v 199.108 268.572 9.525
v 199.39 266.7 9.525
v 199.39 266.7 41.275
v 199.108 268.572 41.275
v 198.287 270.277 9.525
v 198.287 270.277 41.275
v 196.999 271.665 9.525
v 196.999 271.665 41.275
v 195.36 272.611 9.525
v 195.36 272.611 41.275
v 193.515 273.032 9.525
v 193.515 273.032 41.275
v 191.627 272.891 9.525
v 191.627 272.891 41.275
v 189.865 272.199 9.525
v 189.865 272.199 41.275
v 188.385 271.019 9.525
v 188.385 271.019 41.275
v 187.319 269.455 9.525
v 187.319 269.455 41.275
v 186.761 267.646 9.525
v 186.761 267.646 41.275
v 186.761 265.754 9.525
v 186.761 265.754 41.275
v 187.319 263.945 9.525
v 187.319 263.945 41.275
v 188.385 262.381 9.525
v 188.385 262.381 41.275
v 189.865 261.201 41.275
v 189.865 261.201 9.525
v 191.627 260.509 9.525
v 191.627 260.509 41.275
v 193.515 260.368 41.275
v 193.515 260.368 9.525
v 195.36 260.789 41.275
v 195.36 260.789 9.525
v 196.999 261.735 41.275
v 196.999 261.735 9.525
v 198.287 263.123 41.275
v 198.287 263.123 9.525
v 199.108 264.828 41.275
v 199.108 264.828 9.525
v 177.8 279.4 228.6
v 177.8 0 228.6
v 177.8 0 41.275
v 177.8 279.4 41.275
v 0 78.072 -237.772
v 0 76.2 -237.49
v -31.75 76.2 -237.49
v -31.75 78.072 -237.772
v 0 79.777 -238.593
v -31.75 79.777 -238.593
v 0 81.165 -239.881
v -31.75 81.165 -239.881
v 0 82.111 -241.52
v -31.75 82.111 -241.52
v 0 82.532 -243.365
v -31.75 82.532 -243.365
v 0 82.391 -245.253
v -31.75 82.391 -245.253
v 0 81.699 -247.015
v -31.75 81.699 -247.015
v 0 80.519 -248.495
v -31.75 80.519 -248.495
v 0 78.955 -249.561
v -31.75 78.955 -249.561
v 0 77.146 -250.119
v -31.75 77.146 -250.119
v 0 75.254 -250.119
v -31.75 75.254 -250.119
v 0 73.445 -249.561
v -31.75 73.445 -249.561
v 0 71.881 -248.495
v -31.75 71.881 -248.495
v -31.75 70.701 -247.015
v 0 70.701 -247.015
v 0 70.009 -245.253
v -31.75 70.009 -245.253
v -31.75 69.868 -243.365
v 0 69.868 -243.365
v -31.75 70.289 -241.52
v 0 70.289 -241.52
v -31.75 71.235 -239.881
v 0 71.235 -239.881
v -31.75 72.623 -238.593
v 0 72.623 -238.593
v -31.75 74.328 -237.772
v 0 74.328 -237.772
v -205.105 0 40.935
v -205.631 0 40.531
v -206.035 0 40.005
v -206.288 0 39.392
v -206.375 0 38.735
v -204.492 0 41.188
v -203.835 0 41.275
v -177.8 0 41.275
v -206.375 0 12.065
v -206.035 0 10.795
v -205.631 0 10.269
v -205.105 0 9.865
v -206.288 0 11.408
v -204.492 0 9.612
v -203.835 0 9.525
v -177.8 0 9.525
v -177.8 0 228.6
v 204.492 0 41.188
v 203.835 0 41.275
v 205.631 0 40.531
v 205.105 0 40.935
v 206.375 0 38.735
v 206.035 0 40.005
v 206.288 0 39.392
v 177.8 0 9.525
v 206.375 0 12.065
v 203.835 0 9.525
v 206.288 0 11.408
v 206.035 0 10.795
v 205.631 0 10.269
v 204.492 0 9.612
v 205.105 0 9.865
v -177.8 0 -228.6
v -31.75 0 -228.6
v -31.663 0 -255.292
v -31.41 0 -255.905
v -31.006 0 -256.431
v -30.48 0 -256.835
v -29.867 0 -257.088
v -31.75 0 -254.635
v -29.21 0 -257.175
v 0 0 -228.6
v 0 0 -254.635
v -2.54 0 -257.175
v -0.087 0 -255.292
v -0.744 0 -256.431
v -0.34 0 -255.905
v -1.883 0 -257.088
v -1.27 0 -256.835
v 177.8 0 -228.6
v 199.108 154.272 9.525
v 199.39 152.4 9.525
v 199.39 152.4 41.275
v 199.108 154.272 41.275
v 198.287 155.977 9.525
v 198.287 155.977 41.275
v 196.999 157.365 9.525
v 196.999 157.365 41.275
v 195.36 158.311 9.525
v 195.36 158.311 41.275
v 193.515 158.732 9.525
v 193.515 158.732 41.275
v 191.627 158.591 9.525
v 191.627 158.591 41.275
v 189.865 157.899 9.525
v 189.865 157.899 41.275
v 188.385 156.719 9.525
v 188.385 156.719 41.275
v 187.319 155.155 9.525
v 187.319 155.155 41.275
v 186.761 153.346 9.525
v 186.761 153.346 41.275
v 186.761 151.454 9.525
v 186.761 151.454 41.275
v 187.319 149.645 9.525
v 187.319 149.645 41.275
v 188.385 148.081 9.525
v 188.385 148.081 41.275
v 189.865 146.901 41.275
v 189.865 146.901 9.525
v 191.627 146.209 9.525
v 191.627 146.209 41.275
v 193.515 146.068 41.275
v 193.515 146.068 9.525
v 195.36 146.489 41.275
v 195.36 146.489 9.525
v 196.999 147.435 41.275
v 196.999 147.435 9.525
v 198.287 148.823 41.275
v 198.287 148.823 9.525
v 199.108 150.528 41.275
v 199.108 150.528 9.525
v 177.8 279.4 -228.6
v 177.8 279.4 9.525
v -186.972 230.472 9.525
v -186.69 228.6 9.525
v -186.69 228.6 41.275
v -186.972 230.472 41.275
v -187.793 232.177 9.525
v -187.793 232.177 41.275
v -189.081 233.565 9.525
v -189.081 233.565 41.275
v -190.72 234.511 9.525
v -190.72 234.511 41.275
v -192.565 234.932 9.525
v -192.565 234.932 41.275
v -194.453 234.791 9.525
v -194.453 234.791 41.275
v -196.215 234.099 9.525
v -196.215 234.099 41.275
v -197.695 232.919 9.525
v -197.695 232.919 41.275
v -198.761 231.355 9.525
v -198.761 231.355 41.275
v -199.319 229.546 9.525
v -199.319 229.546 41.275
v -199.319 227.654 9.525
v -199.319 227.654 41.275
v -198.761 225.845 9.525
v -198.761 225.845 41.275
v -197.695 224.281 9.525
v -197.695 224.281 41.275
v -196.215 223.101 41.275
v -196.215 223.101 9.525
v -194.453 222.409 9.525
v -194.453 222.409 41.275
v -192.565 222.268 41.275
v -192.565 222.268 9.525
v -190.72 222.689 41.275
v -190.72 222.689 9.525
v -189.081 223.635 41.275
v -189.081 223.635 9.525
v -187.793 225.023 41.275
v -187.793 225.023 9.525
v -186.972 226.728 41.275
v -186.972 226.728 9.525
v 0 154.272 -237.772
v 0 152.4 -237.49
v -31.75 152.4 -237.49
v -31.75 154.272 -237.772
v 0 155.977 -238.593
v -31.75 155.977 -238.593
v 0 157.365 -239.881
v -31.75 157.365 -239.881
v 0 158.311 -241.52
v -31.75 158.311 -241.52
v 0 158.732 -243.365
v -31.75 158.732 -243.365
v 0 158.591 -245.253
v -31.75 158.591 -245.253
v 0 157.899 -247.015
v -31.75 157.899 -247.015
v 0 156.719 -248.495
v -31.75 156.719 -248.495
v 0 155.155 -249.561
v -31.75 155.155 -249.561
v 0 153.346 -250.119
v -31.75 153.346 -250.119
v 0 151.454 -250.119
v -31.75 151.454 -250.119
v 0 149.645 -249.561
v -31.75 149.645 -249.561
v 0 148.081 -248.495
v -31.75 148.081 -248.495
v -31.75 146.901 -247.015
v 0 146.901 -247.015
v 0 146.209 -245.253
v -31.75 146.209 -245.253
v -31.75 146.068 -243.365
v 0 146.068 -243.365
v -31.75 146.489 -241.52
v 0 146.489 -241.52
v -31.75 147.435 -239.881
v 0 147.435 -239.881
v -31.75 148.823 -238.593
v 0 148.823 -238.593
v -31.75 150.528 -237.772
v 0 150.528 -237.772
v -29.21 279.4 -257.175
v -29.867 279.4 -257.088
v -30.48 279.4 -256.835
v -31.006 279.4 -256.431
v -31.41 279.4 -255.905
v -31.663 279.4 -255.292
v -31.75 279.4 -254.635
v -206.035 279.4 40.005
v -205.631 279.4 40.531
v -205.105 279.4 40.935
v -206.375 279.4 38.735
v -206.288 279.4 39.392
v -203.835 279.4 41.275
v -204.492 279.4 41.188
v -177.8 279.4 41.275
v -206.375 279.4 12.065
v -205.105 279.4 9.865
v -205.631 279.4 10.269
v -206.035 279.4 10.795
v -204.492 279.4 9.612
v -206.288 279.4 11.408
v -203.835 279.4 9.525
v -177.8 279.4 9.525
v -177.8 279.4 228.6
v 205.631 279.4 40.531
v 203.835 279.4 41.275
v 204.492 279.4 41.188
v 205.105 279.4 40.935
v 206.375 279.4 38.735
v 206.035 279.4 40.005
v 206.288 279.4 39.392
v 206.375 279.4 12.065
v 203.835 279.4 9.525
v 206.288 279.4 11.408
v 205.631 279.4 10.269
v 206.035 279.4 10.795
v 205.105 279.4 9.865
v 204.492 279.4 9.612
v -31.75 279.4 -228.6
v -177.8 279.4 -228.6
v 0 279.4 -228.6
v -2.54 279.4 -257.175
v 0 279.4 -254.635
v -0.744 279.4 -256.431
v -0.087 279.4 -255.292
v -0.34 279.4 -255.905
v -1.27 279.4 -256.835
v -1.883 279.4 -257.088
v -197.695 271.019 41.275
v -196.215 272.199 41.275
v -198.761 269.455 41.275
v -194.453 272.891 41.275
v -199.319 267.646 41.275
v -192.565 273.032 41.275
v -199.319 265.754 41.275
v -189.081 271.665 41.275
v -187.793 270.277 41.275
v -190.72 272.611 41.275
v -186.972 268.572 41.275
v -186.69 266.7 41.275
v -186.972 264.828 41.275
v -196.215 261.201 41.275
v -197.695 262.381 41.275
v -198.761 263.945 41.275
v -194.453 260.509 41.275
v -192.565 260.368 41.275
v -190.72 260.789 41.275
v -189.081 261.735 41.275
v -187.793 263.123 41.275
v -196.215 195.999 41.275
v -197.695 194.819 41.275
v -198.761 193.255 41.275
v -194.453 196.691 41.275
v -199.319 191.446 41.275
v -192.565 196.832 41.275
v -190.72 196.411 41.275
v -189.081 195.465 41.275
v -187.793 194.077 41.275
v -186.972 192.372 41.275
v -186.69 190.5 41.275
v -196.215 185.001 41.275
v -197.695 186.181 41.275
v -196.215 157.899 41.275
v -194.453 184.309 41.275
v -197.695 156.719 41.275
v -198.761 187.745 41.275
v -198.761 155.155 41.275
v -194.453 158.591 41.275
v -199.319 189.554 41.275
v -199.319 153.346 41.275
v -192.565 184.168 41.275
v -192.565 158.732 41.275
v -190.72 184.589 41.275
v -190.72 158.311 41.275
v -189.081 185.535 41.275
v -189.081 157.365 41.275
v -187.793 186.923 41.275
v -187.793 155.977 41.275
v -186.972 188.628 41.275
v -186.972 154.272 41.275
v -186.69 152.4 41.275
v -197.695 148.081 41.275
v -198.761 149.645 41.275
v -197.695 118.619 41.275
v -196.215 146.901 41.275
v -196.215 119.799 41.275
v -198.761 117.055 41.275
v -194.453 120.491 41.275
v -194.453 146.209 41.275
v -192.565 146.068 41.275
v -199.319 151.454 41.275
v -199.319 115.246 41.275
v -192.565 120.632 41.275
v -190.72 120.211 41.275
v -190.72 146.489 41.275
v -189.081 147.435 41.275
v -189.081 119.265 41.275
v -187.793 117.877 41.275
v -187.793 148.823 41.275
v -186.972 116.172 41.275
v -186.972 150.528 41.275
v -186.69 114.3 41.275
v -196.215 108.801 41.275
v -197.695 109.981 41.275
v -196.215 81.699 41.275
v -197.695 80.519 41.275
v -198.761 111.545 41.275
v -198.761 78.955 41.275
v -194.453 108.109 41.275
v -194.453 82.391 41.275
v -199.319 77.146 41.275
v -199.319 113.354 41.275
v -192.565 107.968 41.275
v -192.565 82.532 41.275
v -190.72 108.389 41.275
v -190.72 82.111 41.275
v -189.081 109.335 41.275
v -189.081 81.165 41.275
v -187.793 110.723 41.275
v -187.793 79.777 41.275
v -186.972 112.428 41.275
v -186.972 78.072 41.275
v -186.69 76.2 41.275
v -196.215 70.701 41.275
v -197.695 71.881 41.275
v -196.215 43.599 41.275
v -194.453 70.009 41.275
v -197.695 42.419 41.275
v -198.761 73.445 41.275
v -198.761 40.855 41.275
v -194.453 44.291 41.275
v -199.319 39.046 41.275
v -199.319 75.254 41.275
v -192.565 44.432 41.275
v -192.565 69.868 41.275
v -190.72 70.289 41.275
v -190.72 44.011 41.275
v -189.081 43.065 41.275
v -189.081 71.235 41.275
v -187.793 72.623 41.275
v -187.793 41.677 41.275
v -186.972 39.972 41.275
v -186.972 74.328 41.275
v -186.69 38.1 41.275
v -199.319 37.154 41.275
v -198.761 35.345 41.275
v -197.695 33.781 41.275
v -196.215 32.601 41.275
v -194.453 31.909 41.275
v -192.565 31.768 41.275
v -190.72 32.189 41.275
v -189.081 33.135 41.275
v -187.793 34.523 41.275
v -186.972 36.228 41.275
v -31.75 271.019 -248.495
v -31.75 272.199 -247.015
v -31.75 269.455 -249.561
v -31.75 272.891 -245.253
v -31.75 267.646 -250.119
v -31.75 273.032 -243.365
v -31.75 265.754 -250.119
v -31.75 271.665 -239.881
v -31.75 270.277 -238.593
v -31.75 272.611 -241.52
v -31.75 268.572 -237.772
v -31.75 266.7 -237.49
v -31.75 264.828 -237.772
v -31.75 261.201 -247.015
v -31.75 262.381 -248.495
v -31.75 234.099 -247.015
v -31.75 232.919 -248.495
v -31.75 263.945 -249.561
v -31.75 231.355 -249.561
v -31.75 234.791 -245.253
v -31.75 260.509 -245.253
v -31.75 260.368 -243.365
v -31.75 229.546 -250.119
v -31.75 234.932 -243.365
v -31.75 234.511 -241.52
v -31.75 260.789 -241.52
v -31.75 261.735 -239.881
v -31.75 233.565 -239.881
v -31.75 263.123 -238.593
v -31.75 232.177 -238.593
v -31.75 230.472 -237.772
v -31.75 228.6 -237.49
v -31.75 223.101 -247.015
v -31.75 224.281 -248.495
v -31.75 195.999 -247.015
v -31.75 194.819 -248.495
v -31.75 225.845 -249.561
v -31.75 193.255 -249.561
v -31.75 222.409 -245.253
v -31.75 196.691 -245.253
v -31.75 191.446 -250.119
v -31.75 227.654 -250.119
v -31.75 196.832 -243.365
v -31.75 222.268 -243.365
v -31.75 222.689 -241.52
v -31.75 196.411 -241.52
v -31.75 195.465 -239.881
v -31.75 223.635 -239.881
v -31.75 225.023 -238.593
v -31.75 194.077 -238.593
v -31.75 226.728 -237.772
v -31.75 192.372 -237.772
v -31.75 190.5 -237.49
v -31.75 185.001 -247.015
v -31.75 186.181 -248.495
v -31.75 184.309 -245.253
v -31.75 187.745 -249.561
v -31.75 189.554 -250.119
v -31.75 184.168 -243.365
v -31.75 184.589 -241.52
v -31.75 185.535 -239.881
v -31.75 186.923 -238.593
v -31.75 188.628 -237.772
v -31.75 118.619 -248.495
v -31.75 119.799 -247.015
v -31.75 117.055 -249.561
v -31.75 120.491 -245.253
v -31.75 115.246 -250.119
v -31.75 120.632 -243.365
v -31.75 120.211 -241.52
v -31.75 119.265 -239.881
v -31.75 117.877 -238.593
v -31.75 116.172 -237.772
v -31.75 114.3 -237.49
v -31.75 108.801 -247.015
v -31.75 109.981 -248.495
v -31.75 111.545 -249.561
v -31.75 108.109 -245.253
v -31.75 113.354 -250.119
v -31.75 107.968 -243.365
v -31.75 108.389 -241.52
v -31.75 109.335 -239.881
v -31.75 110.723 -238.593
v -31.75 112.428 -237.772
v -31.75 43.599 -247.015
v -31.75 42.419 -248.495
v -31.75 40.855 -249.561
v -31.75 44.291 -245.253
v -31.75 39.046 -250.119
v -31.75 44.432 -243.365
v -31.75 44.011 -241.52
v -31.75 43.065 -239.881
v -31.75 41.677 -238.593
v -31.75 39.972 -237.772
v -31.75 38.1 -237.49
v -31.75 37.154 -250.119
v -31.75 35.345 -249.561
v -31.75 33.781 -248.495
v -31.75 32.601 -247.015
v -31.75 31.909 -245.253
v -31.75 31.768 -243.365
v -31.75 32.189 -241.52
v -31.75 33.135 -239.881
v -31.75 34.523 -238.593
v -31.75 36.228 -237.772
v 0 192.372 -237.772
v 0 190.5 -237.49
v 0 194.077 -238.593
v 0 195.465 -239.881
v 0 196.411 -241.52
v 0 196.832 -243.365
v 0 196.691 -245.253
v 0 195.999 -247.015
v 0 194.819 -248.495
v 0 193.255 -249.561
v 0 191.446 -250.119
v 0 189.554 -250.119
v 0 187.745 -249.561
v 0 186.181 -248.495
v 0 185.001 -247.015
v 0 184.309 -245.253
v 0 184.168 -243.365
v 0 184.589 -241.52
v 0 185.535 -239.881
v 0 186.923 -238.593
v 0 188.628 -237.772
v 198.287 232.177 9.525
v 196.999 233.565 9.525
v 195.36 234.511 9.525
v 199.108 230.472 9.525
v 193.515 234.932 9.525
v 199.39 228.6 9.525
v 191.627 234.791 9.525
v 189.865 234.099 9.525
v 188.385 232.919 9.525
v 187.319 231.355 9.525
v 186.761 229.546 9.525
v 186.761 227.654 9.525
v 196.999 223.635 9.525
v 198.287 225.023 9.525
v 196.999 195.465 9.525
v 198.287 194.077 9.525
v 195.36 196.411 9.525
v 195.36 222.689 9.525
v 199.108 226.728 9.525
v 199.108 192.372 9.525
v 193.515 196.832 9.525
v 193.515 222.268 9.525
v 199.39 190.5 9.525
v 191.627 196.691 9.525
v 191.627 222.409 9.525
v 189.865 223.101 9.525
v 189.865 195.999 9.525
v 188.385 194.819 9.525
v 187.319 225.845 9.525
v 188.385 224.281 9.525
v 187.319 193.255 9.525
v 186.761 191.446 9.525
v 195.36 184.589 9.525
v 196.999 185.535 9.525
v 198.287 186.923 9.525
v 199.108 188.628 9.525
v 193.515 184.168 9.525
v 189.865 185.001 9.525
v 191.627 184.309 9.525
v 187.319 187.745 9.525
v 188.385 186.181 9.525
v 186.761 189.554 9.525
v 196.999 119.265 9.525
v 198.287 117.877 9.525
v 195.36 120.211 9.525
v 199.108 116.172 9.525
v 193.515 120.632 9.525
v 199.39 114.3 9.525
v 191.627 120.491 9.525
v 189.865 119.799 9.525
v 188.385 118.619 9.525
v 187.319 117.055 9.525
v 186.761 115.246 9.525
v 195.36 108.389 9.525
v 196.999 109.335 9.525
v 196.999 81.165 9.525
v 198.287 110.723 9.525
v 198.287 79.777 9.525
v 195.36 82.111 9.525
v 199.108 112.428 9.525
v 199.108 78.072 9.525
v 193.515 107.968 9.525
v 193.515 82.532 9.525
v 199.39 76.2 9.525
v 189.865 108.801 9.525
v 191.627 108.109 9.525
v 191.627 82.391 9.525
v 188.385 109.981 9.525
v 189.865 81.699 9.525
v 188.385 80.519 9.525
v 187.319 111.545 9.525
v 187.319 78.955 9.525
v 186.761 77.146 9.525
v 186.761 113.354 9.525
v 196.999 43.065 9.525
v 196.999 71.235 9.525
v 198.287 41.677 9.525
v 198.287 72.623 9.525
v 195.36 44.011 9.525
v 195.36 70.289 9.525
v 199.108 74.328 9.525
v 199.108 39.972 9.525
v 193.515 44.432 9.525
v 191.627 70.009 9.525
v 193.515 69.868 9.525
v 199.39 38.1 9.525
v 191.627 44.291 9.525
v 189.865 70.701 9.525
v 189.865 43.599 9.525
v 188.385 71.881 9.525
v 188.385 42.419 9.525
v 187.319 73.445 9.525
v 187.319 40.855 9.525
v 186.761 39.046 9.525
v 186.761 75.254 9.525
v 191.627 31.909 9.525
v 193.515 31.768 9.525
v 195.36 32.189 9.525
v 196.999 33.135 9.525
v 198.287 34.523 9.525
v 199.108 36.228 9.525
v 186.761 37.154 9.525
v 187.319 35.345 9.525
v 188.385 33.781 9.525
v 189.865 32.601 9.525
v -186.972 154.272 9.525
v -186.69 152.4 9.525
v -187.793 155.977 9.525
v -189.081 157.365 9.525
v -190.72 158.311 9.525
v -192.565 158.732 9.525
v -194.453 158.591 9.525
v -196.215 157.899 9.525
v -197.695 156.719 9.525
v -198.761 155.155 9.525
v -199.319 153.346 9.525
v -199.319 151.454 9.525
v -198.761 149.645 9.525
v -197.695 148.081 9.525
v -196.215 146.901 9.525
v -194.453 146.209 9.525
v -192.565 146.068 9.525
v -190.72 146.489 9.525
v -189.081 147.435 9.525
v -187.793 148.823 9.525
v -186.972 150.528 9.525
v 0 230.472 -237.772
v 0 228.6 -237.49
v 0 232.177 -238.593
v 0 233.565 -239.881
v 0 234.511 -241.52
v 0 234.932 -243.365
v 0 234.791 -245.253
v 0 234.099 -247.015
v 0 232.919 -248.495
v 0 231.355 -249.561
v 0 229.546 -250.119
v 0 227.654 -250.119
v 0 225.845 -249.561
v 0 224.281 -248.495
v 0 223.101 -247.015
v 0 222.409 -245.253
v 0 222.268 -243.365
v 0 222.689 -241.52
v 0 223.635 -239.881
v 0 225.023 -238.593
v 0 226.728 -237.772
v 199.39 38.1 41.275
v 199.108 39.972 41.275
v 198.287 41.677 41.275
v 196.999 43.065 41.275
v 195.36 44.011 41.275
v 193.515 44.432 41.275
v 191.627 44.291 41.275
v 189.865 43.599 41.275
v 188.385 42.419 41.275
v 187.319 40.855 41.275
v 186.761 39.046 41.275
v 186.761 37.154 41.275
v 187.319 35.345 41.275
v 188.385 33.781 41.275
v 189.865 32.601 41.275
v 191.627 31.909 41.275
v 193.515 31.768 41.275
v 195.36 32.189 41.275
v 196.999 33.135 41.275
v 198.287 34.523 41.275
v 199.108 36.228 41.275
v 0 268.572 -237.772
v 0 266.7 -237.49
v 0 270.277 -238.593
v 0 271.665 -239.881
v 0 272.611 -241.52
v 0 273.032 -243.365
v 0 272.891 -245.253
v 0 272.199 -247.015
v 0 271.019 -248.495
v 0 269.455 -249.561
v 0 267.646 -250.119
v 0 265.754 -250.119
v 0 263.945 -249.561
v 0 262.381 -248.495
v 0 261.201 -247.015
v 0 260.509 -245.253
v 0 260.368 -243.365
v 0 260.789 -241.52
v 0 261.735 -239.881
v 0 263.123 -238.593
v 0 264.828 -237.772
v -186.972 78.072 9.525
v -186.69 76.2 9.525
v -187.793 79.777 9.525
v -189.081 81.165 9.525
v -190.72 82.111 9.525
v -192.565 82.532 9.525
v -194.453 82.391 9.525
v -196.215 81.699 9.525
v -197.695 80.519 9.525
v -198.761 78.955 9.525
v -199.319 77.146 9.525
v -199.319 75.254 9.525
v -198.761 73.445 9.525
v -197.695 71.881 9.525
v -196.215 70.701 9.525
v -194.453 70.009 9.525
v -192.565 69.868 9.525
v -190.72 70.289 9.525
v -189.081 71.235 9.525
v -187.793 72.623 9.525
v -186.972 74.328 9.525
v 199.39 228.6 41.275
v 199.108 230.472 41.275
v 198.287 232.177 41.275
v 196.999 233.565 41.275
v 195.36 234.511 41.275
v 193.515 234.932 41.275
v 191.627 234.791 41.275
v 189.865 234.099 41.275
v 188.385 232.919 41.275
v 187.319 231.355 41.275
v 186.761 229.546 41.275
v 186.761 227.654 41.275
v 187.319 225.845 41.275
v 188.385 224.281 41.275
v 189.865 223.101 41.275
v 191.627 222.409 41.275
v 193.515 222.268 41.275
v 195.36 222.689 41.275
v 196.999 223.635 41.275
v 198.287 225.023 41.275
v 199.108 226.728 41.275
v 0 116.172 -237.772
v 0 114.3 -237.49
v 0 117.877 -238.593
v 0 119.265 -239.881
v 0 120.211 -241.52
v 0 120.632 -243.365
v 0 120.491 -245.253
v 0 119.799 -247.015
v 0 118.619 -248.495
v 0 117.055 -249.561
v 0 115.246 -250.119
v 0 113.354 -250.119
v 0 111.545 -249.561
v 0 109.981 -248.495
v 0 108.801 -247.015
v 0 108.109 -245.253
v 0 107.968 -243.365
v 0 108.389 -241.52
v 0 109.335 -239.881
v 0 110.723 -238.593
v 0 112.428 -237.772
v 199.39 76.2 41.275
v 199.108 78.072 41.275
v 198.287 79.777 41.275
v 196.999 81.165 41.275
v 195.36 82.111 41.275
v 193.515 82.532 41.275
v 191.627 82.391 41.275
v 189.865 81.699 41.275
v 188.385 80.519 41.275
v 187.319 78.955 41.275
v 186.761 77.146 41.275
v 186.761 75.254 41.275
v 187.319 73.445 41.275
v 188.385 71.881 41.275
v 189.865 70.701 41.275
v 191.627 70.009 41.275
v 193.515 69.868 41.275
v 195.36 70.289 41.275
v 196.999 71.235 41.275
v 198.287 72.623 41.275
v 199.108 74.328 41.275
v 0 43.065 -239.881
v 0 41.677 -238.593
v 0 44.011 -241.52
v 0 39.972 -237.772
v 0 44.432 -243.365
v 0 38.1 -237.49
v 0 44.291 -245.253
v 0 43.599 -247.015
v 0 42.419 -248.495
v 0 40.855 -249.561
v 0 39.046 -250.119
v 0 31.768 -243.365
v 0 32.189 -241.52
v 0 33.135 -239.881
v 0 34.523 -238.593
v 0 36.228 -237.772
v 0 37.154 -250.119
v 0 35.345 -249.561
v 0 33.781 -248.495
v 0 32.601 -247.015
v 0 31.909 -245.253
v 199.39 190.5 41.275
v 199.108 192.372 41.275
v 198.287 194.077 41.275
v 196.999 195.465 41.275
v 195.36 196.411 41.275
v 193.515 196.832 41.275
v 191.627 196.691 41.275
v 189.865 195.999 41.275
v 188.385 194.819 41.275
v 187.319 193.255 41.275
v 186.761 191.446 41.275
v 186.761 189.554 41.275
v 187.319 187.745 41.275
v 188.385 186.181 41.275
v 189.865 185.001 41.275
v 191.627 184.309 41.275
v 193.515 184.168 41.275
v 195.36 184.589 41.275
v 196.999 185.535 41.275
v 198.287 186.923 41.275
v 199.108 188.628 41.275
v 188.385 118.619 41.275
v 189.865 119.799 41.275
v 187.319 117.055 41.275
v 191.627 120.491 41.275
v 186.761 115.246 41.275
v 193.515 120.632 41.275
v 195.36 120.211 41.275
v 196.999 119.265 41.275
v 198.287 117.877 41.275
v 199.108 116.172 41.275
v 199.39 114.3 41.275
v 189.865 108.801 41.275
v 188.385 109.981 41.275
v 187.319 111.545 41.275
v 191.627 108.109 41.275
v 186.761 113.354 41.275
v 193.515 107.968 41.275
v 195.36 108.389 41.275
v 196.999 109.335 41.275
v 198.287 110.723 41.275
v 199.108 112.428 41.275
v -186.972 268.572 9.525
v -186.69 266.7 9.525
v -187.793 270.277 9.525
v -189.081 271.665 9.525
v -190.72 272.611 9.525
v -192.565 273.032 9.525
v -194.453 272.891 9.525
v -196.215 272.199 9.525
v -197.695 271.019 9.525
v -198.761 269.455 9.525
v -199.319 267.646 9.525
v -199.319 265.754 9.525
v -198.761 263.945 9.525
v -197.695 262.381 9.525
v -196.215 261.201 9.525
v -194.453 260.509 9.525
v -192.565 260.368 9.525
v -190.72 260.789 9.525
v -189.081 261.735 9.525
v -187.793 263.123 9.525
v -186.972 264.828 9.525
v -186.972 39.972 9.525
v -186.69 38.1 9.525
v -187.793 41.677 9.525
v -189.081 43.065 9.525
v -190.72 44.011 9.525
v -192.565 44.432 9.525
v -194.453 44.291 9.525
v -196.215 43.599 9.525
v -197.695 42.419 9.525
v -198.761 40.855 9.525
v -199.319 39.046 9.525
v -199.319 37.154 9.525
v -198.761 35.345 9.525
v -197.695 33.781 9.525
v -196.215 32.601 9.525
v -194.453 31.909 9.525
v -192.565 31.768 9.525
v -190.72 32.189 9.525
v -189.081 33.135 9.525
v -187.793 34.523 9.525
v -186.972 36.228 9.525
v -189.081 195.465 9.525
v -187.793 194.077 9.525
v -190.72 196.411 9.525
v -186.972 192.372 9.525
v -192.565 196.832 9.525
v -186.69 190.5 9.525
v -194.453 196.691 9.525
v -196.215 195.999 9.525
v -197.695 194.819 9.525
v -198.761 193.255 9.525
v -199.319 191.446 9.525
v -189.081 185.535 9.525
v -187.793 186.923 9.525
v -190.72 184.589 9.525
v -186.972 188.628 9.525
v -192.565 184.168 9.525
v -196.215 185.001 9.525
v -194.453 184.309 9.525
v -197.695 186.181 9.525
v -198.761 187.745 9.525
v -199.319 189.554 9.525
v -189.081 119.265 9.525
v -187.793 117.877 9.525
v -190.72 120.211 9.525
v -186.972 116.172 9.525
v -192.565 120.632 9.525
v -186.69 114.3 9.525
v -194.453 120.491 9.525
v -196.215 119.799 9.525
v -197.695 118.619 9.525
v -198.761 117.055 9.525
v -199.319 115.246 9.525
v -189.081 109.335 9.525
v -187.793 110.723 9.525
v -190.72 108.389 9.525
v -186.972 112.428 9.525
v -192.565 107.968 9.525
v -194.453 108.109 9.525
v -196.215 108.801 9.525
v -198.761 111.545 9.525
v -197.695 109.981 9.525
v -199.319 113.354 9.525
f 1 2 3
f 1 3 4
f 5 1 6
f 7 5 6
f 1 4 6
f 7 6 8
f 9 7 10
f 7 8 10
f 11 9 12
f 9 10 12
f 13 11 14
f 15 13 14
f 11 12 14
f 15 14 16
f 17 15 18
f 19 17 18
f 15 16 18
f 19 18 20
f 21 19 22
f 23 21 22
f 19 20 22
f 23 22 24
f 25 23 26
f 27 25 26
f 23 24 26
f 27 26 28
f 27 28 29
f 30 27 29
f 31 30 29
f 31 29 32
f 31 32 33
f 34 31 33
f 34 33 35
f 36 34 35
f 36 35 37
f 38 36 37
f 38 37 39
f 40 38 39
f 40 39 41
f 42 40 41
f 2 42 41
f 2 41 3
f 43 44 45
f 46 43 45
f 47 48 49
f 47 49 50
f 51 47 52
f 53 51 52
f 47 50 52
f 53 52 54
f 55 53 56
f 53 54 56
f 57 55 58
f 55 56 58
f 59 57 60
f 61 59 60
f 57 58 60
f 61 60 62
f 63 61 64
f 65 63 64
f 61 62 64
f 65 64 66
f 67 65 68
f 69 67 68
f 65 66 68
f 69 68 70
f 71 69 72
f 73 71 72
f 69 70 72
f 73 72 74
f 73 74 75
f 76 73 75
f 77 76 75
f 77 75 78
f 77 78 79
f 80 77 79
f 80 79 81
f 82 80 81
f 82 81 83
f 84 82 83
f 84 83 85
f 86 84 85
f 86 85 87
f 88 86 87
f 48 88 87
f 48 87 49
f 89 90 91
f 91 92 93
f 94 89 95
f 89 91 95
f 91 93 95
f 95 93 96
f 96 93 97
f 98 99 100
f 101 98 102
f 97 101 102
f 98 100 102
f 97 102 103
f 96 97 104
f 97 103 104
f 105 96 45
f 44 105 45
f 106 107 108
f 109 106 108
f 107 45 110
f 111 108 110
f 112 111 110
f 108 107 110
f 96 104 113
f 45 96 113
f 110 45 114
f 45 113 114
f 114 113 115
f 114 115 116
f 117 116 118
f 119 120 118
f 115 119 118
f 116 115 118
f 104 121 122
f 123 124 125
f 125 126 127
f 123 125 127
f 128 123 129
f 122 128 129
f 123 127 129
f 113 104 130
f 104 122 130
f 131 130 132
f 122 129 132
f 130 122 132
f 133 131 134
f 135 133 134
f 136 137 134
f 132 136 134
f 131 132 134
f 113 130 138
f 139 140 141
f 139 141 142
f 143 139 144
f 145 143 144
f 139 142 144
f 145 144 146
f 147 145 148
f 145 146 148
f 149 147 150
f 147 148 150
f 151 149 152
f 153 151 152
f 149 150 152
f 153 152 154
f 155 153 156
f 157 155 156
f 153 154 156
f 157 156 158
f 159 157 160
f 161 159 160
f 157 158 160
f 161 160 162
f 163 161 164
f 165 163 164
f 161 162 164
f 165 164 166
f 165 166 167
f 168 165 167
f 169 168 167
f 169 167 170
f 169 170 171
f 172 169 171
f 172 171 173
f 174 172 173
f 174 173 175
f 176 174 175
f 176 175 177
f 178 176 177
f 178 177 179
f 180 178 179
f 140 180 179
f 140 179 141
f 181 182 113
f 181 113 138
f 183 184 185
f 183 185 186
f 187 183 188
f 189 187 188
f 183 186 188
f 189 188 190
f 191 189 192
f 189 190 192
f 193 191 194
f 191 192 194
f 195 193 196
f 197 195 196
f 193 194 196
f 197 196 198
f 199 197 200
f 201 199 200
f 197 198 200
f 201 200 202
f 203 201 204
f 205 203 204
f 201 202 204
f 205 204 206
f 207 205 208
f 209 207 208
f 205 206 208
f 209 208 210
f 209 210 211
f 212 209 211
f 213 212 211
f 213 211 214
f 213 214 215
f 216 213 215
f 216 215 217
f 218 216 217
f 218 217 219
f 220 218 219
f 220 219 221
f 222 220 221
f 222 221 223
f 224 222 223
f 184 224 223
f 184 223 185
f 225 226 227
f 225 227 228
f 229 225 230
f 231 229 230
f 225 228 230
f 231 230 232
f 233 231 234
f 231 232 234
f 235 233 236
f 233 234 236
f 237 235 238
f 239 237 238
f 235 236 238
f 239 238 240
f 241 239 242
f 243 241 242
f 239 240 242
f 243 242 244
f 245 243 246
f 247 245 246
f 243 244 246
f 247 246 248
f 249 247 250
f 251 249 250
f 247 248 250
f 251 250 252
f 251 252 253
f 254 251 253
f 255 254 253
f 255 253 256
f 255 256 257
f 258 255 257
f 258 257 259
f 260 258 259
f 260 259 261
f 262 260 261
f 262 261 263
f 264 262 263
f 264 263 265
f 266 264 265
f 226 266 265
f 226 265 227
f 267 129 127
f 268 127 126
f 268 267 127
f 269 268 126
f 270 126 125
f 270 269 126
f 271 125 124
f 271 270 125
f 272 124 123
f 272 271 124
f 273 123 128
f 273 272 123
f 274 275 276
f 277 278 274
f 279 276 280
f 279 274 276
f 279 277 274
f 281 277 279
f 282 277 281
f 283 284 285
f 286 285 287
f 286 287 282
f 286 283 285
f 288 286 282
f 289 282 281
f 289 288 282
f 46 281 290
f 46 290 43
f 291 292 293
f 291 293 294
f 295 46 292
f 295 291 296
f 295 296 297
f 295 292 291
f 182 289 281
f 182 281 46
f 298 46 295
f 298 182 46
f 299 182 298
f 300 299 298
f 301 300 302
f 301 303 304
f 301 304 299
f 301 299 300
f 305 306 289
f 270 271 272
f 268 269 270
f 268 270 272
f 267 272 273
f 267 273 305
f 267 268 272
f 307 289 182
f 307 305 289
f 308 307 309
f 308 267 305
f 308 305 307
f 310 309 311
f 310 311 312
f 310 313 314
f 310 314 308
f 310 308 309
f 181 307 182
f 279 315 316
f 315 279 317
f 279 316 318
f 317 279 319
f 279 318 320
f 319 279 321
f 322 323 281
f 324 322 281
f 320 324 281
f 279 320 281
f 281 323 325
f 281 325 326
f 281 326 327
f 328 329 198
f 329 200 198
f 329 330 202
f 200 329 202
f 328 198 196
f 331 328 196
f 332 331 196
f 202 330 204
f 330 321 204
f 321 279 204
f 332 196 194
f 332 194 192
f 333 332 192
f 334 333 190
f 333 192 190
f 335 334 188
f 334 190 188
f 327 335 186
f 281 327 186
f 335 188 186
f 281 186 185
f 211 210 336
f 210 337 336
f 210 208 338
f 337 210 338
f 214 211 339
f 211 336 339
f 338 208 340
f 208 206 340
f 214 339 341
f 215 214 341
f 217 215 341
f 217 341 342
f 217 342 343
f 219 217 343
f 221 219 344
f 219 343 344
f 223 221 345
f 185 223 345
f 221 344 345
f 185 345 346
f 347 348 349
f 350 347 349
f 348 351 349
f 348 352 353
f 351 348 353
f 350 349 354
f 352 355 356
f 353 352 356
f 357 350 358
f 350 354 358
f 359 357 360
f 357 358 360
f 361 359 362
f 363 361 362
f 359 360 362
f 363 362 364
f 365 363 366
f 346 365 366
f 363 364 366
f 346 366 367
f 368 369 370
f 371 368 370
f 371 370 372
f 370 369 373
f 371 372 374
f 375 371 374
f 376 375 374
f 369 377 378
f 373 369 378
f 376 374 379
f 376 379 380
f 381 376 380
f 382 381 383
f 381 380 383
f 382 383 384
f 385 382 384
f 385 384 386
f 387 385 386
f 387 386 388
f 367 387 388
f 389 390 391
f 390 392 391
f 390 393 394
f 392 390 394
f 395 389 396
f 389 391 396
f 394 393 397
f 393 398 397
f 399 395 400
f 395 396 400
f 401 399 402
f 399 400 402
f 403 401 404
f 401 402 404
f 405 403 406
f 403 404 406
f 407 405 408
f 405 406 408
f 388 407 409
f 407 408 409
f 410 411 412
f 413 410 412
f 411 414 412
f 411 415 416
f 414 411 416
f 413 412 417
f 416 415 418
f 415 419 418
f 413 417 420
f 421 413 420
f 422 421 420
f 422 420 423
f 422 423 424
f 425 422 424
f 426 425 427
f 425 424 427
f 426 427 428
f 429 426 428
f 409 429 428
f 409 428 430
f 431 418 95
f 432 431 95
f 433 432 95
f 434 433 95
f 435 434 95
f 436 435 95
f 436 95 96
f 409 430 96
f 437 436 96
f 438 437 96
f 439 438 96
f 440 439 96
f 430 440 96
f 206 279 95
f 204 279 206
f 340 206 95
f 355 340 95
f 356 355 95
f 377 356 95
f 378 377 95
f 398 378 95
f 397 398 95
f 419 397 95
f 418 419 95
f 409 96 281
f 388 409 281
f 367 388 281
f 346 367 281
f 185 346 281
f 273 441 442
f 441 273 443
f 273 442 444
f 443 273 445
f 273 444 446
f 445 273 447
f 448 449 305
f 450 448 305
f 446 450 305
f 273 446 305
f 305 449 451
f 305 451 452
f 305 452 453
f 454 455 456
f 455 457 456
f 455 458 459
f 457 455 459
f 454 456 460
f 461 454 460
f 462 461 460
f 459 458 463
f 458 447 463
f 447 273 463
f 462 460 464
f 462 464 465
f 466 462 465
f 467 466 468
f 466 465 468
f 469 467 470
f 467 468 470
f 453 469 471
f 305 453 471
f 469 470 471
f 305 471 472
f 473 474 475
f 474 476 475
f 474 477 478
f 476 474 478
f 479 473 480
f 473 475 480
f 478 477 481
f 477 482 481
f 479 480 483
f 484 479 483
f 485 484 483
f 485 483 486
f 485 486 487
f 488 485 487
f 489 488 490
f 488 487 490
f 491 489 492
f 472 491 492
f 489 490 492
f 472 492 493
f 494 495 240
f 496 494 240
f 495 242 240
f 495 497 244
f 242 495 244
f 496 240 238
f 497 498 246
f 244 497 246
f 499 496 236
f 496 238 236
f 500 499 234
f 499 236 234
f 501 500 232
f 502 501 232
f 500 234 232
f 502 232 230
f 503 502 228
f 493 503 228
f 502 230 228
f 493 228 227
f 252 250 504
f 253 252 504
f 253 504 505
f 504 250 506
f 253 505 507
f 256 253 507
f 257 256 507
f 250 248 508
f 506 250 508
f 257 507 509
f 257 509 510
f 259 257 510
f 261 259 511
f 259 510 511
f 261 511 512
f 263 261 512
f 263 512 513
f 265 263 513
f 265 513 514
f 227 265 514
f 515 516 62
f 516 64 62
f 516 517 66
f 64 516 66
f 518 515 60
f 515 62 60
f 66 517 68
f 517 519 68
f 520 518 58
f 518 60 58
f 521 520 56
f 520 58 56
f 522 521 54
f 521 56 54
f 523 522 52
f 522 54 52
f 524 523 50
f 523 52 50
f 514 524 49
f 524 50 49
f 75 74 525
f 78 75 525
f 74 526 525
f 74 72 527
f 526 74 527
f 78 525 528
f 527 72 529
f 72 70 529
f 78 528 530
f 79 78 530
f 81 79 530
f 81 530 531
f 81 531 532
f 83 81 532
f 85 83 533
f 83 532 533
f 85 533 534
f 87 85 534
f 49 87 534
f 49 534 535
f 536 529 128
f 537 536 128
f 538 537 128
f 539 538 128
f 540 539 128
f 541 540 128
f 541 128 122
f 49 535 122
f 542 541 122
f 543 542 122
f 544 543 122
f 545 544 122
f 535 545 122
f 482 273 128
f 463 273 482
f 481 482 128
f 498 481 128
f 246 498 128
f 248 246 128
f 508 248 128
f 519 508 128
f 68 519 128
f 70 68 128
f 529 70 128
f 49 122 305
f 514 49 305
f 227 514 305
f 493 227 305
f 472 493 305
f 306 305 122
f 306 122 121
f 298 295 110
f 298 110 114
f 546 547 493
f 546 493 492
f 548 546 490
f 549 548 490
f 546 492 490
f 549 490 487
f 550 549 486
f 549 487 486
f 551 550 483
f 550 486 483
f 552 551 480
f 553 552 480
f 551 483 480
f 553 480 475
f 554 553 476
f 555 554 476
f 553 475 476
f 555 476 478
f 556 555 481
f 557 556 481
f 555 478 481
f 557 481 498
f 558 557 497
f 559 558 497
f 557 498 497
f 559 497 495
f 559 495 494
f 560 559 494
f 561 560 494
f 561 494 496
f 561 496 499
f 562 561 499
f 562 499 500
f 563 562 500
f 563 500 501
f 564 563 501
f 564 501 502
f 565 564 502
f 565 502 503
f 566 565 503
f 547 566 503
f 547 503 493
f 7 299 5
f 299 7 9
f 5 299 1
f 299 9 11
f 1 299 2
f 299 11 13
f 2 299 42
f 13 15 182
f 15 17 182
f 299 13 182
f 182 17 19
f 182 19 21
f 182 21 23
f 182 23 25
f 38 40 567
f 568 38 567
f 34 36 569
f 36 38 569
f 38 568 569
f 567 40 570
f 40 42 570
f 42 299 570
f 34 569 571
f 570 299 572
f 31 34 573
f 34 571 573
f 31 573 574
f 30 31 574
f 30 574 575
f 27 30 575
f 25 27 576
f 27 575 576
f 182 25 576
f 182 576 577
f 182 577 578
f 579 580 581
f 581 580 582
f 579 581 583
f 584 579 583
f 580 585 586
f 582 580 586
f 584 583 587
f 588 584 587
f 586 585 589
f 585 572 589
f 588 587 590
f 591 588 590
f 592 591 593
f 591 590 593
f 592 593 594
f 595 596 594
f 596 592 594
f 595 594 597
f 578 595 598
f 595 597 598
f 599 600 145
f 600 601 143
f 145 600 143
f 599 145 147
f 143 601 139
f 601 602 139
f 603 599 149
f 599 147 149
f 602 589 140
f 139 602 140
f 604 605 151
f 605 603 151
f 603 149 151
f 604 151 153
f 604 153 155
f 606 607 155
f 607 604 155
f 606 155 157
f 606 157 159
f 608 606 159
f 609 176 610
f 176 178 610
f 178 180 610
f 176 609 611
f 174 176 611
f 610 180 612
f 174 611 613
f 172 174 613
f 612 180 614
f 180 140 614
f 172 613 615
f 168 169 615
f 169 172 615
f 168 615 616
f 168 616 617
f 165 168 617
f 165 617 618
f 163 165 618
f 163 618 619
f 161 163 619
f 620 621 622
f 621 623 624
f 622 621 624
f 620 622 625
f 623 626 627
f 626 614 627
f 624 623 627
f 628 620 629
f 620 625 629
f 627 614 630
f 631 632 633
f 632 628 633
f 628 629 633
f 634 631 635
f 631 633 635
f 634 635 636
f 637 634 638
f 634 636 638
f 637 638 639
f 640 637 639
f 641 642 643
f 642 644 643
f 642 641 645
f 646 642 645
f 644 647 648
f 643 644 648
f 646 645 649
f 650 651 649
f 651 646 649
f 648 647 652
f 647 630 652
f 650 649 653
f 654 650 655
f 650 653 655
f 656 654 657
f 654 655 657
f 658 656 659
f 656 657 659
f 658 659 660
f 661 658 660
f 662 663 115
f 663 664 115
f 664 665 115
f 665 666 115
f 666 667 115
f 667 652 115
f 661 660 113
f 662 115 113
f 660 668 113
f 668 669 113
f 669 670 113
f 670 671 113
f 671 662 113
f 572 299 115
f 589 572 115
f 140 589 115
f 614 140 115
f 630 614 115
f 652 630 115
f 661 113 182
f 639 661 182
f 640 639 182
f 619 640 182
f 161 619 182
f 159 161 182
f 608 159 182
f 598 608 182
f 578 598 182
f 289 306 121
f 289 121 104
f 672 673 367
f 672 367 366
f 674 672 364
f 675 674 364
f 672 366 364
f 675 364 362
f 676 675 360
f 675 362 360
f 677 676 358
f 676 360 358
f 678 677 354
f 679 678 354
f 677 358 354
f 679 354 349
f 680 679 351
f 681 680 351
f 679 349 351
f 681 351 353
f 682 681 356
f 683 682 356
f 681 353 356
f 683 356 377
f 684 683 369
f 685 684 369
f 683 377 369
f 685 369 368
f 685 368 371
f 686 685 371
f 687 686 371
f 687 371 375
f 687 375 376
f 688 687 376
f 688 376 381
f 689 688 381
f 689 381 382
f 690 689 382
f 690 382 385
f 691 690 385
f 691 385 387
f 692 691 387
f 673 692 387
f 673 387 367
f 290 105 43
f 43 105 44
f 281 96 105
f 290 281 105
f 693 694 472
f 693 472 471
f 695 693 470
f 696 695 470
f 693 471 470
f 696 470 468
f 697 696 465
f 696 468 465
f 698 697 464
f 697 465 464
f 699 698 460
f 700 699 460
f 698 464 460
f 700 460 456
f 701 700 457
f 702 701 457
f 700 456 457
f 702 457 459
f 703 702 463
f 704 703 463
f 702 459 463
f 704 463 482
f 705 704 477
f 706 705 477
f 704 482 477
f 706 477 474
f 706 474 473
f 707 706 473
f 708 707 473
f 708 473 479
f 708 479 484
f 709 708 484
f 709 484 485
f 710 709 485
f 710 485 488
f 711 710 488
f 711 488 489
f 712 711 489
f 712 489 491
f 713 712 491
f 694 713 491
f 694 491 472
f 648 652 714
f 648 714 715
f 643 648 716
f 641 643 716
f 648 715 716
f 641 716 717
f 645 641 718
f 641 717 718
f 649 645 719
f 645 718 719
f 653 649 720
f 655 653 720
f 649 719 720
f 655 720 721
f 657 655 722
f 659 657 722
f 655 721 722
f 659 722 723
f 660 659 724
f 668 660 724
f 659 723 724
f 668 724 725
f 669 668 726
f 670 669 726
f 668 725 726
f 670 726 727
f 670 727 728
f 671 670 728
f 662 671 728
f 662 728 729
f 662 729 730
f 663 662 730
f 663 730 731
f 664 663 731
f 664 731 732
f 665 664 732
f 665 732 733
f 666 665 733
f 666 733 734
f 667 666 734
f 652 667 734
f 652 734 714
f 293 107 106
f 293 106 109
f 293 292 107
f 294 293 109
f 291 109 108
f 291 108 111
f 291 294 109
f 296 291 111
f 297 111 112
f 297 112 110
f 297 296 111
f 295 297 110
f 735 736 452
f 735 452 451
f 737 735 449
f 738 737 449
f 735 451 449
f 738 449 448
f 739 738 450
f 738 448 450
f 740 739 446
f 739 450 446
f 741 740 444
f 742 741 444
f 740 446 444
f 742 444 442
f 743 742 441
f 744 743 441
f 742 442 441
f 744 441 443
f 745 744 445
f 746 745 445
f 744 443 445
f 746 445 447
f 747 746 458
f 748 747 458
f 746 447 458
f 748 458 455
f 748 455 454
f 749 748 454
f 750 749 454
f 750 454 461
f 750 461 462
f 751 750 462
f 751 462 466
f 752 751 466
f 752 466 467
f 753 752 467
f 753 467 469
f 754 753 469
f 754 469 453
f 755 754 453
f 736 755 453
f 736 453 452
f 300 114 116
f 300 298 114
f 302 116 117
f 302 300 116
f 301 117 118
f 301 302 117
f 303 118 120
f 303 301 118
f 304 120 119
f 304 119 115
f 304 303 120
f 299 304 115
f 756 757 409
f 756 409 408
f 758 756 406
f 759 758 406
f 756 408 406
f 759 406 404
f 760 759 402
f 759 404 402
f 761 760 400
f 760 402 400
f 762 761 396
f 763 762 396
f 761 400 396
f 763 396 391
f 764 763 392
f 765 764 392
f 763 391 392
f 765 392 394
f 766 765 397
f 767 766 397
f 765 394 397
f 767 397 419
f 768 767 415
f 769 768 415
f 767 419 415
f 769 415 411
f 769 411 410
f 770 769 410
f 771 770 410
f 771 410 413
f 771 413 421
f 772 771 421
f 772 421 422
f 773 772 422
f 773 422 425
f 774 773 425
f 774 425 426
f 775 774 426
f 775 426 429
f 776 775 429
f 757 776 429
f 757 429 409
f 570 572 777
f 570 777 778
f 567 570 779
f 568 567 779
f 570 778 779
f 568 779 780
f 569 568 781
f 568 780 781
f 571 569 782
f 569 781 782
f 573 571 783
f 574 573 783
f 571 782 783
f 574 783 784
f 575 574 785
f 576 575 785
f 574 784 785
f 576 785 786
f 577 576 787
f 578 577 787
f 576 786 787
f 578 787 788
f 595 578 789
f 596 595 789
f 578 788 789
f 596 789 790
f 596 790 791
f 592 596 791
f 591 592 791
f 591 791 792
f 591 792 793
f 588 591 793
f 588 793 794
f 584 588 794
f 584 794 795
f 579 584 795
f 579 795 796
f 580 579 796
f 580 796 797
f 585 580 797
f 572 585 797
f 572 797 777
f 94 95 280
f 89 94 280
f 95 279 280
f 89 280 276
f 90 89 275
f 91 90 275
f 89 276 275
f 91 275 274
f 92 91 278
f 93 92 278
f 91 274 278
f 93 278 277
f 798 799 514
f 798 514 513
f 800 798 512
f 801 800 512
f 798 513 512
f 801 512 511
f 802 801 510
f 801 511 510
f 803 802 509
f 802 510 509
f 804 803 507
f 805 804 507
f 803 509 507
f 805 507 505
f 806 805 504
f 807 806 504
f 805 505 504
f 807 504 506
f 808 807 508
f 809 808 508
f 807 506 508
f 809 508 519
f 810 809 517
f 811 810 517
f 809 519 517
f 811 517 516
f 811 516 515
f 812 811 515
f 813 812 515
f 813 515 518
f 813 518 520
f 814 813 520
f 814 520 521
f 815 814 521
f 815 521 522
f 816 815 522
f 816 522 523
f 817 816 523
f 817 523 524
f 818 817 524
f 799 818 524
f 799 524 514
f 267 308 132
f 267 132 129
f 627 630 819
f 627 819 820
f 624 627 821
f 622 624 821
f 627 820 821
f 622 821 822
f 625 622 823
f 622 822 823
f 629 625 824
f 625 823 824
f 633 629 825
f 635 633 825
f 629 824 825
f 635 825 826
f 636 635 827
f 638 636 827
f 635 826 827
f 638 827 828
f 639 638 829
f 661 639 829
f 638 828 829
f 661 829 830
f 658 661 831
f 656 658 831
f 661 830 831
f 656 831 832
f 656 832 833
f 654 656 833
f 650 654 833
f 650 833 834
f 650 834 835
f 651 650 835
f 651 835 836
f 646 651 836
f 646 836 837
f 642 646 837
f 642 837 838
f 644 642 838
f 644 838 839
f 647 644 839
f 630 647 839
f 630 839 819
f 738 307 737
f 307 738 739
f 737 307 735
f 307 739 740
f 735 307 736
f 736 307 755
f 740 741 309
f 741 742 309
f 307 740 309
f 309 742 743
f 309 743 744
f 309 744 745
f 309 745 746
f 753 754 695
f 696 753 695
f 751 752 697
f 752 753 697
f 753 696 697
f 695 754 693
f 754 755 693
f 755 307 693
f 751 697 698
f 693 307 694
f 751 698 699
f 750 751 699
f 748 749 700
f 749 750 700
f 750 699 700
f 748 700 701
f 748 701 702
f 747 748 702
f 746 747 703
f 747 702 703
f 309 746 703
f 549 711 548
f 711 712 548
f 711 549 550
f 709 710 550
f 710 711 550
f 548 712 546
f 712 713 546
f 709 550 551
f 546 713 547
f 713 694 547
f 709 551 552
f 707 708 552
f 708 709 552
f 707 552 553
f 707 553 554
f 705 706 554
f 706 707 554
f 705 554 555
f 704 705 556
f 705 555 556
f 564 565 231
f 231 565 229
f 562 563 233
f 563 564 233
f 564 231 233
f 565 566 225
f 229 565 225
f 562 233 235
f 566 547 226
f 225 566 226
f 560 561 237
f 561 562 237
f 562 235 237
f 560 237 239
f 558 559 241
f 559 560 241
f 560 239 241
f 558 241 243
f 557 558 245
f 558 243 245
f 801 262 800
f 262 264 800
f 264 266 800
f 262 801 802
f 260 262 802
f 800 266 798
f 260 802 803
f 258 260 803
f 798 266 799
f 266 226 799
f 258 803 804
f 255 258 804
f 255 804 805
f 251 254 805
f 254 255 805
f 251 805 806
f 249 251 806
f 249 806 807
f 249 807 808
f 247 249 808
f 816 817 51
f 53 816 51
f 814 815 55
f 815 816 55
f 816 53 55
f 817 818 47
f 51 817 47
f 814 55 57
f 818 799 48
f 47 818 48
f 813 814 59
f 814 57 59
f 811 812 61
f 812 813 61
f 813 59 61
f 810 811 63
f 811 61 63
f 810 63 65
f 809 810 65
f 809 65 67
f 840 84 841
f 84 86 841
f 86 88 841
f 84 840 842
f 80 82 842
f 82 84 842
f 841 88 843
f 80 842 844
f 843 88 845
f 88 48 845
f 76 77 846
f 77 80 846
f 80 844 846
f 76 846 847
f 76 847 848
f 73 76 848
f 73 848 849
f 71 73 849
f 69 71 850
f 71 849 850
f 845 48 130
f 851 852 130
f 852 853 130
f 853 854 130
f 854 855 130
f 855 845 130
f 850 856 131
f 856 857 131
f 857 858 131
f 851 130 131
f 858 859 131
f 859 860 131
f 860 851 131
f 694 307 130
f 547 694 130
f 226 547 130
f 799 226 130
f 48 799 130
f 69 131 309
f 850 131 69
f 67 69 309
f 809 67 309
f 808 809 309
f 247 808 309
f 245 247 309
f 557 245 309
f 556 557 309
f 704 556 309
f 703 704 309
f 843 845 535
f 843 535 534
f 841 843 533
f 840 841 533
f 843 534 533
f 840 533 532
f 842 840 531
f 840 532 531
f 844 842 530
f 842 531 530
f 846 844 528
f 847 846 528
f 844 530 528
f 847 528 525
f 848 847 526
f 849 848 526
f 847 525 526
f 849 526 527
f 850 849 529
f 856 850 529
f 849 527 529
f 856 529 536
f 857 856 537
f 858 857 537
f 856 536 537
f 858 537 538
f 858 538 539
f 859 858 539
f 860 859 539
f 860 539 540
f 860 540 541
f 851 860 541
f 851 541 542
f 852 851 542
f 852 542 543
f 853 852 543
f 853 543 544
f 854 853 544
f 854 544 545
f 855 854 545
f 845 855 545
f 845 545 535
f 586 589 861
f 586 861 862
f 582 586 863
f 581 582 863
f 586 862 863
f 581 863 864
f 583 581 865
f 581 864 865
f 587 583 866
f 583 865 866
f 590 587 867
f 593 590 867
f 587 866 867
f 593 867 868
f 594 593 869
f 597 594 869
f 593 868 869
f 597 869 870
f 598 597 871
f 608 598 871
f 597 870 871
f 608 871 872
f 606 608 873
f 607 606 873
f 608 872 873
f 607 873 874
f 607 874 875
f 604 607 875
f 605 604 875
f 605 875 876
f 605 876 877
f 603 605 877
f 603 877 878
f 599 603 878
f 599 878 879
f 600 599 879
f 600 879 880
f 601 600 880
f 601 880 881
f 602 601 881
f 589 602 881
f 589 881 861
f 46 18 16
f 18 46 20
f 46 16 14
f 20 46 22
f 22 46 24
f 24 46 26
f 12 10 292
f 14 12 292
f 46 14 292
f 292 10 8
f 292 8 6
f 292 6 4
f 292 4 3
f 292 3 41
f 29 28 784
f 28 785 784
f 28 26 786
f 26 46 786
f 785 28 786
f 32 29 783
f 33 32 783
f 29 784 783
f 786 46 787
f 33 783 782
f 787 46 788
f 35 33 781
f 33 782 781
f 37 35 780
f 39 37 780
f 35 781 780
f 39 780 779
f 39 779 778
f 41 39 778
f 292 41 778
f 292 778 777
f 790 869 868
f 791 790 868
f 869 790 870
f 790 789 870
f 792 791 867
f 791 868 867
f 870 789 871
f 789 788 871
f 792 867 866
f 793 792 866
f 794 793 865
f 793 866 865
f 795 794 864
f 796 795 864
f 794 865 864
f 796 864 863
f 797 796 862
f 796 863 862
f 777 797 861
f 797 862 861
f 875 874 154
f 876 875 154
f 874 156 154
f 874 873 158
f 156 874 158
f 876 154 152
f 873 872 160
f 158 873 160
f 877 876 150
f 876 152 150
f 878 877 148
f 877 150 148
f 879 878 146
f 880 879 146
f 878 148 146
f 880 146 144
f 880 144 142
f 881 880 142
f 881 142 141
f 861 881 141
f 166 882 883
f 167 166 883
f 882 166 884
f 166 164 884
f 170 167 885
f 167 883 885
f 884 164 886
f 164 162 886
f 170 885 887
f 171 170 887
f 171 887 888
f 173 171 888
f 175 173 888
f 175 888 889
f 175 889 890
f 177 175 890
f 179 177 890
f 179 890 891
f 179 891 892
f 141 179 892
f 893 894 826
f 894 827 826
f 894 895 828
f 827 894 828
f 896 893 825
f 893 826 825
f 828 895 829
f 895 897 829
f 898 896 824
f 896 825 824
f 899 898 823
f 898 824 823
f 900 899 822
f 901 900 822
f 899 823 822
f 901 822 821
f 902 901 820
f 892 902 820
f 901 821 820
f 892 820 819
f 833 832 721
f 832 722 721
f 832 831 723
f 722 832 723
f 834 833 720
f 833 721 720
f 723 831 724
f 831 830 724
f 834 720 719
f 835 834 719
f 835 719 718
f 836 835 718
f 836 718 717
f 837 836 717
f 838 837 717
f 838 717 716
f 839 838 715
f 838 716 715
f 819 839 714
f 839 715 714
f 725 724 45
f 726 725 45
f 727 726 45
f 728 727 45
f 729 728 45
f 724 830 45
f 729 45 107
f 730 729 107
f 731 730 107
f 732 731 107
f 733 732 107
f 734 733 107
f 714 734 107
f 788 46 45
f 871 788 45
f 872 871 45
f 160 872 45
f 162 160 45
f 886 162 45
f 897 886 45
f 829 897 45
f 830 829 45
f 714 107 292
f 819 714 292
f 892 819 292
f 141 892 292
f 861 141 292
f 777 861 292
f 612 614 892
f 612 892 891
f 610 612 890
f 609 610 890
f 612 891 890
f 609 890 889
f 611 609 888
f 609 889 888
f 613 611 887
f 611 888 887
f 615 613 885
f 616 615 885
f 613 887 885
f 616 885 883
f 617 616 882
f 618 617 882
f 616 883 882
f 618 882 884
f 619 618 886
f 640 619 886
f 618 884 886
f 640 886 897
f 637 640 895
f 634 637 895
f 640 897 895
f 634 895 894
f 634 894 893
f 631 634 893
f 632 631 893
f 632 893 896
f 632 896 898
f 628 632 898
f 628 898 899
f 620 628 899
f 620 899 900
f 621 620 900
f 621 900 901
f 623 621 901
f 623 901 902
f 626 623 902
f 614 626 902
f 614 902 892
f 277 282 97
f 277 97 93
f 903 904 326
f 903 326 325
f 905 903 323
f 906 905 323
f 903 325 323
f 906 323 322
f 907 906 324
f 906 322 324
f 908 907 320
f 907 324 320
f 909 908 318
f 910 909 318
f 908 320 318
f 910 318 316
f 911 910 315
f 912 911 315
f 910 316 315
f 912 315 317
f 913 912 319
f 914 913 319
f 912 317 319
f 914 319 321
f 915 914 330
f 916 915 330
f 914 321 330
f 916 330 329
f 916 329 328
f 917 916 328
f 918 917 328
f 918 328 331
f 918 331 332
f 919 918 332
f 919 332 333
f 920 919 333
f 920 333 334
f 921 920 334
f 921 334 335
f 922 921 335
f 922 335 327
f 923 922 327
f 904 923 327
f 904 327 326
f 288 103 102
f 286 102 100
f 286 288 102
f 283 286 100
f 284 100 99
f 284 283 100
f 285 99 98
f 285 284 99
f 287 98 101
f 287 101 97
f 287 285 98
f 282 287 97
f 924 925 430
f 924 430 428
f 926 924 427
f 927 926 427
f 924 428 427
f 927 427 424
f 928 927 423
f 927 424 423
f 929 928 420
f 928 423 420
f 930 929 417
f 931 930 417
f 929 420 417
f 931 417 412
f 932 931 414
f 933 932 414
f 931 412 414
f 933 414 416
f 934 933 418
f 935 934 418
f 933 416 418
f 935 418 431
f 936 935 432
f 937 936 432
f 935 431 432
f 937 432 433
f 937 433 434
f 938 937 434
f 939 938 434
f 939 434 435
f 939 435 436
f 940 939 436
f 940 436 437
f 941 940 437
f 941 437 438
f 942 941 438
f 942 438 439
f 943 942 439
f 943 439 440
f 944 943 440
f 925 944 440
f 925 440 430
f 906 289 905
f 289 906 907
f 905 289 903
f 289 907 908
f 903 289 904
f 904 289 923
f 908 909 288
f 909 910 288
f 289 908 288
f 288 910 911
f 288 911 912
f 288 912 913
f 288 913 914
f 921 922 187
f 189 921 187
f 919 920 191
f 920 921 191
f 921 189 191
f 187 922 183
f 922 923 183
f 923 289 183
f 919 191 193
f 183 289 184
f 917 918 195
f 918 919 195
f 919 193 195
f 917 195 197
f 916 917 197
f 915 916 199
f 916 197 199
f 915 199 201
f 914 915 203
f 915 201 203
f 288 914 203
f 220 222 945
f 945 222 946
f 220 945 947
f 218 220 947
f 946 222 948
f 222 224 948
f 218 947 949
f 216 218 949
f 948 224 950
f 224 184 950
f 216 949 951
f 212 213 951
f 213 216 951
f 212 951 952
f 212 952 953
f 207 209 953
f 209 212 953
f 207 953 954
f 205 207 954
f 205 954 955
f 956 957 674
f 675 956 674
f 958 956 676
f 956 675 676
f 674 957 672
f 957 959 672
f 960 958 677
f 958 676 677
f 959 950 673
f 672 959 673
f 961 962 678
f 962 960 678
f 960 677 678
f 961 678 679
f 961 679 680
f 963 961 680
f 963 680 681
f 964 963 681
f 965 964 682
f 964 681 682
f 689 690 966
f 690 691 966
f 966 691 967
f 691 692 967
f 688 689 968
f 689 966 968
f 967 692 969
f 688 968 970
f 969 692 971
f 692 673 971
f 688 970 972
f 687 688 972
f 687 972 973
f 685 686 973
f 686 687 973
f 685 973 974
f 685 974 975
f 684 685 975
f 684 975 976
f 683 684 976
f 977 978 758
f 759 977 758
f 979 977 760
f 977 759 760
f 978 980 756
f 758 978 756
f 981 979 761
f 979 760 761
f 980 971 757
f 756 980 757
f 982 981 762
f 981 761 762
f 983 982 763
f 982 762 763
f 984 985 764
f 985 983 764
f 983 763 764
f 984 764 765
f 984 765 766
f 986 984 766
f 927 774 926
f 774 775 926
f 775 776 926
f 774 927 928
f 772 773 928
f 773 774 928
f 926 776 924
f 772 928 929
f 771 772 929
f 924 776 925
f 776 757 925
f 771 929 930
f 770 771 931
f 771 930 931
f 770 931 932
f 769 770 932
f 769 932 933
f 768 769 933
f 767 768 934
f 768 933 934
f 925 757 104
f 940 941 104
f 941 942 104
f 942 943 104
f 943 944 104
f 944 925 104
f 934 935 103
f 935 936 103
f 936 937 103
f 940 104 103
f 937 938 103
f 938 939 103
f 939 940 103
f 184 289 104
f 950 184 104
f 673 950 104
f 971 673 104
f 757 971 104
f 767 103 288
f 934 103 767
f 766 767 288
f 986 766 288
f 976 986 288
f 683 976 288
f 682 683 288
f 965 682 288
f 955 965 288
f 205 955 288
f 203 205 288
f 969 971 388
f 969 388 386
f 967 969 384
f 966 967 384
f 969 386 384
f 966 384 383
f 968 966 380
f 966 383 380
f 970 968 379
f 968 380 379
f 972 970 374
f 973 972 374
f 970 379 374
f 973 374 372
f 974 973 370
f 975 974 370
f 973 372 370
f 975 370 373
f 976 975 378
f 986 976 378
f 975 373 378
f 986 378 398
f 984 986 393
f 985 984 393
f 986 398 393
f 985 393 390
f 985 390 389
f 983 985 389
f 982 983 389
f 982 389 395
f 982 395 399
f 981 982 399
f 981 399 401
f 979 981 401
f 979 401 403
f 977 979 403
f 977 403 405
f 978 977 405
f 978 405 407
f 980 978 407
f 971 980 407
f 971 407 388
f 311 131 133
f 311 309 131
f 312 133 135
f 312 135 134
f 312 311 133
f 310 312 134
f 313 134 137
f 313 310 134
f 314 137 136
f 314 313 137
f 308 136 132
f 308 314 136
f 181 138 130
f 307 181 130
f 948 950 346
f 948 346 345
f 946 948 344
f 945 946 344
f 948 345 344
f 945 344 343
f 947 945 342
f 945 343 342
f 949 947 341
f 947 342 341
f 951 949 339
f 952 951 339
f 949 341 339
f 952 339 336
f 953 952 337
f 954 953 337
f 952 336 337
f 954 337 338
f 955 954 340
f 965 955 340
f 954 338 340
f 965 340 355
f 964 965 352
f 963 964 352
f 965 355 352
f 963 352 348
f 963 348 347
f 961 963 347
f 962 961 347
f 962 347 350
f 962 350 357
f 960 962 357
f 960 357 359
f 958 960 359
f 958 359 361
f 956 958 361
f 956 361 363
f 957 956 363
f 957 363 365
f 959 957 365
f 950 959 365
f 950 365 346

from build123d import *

# Parameters (mm, degrees)
BOSS_EXTRUDE1_DEPTH = 279.4
SKETCH2_R           = 6.35
CUT_EXTRUDE1_DEPTH  = 45.72
SKETCH3_R           = 6.35
CUT_EXTRUDE2_DEPTH  = 45.72
FILLET1_R           = 2.54


with BuildPart() as part:
    # Sketch1 → Boss-Extrude1 (new body)
    with BuildSketch(Plane(origin=(0, 0, 0), x_dir=(1, 0, 0), z_dir=(0, 1, 0))):
        Polygon((-177.8, -228.6), (-31.75, -228.6), (31.75, -228.6), (177.8, -228.6), (177.8, -41.275), (206.375, -41.275), (206.375, -9.525), (177.8, -9.525), (177.8, 228.6), (0, 228.6), (0, 257.175), (-31.75, 257.175), (-31.75, 228.6), (-177.8, 228.6), (-177.8, -9.525), (-206.375, -9.525), (-206.375, -41.275), (-177.8, -41.275), align=None)
    extrude(amount=BOSS_EXTRUDE1_DEPTH)

    # Sketch2 → Cut-Extrude1 (cut)
    with BuildSketch(Plane.XY.offset(41.275)):
        with Locations((-193.04, 38.1)):
            Circle(SKETCH2_R)
        with Locations((-193.04, 76.2)):
            Circle(SKETCH2_R)
        with Locations((-193.04, 114.3)):
            Circle(SKETCH2_R)
        with Locations((-193.04, 152.4)):
            Circle(SKETCH2_R)
        with Locations((-193.04, 190.5)):
            Circle(SKETCH2_R)
        with Locations((-193.04, 228.6)):
            Circle(SKETCH2_R)
        with Locations((-193.04, 266.7)):
            Circle(SKETCH2_R)
        with Locations((193.04, 266.7)):
            Circle(SKETCH2_R)
        with Locations((193.04, 228.6)):
            Circle(SKETCH2_R)
        with Locations((193.04, 190.5)):
            Circle(SKETCH2_R)
        with Locations((193.04, 152.4)):
            Circle(SKETCH2_R)
        with Locations((193.04, 114.3)):
            Circle(SKETCH2_R)
        with Locations((193.04, 76.2)):
            Circle(SKETCH2_R)
        with Locations((193.04, 38.1)):
            Circle(SKETCH2_R)
    extrude(amount=-CUT_EXTRUDE1_DEPTH, mode=Mode.SUBTRACT)

    # Sketch3 → Cut-Extrude2 (cut)
    with BuildSketch(Plane.ZY.offset(31.75)):
        with Locations((-243.84, 38.1)):
            Circle(SKETCH3_R)
        with Locations((-243.84, 76.2)):
            Circle(SKETCH3_R)
        with Locations((-243.84, 114.3)):
            Circle(SKETCH3_R)
        with Locations((-243.84, 152.4)):
            Circle(SKETCH3_R)
        with Locations((-243.84, 190.5)):
            Circle(SKETCH3_R)
        with Locations((-243.84, 228.6)):
            Circle(SKETCH3_R)
        with Locations((-243.84, 266.7)):
            Circle(SKETCH3_R)
    extrude(amount=-CUT_EXTRUDE2_DEPTH, mode=Mode.SUBTRACT)

    # Fillet1
    fillet1_edges = [part.edges().sort_by_distance(p)[0] for p in [
        (-206.375, 139.7, 41.275),
        (-206.375, 139.7, 9.525),
        (-31.75, 139.7, -257.175),
        (0, 139.7, -257.175),
        (206.375, 139.7, 9.525),
        (206.375, 139.7, 41.275),
    ]]
    fillet(fillet1_edges, radius=FILLET1_R)


solid = part.part
